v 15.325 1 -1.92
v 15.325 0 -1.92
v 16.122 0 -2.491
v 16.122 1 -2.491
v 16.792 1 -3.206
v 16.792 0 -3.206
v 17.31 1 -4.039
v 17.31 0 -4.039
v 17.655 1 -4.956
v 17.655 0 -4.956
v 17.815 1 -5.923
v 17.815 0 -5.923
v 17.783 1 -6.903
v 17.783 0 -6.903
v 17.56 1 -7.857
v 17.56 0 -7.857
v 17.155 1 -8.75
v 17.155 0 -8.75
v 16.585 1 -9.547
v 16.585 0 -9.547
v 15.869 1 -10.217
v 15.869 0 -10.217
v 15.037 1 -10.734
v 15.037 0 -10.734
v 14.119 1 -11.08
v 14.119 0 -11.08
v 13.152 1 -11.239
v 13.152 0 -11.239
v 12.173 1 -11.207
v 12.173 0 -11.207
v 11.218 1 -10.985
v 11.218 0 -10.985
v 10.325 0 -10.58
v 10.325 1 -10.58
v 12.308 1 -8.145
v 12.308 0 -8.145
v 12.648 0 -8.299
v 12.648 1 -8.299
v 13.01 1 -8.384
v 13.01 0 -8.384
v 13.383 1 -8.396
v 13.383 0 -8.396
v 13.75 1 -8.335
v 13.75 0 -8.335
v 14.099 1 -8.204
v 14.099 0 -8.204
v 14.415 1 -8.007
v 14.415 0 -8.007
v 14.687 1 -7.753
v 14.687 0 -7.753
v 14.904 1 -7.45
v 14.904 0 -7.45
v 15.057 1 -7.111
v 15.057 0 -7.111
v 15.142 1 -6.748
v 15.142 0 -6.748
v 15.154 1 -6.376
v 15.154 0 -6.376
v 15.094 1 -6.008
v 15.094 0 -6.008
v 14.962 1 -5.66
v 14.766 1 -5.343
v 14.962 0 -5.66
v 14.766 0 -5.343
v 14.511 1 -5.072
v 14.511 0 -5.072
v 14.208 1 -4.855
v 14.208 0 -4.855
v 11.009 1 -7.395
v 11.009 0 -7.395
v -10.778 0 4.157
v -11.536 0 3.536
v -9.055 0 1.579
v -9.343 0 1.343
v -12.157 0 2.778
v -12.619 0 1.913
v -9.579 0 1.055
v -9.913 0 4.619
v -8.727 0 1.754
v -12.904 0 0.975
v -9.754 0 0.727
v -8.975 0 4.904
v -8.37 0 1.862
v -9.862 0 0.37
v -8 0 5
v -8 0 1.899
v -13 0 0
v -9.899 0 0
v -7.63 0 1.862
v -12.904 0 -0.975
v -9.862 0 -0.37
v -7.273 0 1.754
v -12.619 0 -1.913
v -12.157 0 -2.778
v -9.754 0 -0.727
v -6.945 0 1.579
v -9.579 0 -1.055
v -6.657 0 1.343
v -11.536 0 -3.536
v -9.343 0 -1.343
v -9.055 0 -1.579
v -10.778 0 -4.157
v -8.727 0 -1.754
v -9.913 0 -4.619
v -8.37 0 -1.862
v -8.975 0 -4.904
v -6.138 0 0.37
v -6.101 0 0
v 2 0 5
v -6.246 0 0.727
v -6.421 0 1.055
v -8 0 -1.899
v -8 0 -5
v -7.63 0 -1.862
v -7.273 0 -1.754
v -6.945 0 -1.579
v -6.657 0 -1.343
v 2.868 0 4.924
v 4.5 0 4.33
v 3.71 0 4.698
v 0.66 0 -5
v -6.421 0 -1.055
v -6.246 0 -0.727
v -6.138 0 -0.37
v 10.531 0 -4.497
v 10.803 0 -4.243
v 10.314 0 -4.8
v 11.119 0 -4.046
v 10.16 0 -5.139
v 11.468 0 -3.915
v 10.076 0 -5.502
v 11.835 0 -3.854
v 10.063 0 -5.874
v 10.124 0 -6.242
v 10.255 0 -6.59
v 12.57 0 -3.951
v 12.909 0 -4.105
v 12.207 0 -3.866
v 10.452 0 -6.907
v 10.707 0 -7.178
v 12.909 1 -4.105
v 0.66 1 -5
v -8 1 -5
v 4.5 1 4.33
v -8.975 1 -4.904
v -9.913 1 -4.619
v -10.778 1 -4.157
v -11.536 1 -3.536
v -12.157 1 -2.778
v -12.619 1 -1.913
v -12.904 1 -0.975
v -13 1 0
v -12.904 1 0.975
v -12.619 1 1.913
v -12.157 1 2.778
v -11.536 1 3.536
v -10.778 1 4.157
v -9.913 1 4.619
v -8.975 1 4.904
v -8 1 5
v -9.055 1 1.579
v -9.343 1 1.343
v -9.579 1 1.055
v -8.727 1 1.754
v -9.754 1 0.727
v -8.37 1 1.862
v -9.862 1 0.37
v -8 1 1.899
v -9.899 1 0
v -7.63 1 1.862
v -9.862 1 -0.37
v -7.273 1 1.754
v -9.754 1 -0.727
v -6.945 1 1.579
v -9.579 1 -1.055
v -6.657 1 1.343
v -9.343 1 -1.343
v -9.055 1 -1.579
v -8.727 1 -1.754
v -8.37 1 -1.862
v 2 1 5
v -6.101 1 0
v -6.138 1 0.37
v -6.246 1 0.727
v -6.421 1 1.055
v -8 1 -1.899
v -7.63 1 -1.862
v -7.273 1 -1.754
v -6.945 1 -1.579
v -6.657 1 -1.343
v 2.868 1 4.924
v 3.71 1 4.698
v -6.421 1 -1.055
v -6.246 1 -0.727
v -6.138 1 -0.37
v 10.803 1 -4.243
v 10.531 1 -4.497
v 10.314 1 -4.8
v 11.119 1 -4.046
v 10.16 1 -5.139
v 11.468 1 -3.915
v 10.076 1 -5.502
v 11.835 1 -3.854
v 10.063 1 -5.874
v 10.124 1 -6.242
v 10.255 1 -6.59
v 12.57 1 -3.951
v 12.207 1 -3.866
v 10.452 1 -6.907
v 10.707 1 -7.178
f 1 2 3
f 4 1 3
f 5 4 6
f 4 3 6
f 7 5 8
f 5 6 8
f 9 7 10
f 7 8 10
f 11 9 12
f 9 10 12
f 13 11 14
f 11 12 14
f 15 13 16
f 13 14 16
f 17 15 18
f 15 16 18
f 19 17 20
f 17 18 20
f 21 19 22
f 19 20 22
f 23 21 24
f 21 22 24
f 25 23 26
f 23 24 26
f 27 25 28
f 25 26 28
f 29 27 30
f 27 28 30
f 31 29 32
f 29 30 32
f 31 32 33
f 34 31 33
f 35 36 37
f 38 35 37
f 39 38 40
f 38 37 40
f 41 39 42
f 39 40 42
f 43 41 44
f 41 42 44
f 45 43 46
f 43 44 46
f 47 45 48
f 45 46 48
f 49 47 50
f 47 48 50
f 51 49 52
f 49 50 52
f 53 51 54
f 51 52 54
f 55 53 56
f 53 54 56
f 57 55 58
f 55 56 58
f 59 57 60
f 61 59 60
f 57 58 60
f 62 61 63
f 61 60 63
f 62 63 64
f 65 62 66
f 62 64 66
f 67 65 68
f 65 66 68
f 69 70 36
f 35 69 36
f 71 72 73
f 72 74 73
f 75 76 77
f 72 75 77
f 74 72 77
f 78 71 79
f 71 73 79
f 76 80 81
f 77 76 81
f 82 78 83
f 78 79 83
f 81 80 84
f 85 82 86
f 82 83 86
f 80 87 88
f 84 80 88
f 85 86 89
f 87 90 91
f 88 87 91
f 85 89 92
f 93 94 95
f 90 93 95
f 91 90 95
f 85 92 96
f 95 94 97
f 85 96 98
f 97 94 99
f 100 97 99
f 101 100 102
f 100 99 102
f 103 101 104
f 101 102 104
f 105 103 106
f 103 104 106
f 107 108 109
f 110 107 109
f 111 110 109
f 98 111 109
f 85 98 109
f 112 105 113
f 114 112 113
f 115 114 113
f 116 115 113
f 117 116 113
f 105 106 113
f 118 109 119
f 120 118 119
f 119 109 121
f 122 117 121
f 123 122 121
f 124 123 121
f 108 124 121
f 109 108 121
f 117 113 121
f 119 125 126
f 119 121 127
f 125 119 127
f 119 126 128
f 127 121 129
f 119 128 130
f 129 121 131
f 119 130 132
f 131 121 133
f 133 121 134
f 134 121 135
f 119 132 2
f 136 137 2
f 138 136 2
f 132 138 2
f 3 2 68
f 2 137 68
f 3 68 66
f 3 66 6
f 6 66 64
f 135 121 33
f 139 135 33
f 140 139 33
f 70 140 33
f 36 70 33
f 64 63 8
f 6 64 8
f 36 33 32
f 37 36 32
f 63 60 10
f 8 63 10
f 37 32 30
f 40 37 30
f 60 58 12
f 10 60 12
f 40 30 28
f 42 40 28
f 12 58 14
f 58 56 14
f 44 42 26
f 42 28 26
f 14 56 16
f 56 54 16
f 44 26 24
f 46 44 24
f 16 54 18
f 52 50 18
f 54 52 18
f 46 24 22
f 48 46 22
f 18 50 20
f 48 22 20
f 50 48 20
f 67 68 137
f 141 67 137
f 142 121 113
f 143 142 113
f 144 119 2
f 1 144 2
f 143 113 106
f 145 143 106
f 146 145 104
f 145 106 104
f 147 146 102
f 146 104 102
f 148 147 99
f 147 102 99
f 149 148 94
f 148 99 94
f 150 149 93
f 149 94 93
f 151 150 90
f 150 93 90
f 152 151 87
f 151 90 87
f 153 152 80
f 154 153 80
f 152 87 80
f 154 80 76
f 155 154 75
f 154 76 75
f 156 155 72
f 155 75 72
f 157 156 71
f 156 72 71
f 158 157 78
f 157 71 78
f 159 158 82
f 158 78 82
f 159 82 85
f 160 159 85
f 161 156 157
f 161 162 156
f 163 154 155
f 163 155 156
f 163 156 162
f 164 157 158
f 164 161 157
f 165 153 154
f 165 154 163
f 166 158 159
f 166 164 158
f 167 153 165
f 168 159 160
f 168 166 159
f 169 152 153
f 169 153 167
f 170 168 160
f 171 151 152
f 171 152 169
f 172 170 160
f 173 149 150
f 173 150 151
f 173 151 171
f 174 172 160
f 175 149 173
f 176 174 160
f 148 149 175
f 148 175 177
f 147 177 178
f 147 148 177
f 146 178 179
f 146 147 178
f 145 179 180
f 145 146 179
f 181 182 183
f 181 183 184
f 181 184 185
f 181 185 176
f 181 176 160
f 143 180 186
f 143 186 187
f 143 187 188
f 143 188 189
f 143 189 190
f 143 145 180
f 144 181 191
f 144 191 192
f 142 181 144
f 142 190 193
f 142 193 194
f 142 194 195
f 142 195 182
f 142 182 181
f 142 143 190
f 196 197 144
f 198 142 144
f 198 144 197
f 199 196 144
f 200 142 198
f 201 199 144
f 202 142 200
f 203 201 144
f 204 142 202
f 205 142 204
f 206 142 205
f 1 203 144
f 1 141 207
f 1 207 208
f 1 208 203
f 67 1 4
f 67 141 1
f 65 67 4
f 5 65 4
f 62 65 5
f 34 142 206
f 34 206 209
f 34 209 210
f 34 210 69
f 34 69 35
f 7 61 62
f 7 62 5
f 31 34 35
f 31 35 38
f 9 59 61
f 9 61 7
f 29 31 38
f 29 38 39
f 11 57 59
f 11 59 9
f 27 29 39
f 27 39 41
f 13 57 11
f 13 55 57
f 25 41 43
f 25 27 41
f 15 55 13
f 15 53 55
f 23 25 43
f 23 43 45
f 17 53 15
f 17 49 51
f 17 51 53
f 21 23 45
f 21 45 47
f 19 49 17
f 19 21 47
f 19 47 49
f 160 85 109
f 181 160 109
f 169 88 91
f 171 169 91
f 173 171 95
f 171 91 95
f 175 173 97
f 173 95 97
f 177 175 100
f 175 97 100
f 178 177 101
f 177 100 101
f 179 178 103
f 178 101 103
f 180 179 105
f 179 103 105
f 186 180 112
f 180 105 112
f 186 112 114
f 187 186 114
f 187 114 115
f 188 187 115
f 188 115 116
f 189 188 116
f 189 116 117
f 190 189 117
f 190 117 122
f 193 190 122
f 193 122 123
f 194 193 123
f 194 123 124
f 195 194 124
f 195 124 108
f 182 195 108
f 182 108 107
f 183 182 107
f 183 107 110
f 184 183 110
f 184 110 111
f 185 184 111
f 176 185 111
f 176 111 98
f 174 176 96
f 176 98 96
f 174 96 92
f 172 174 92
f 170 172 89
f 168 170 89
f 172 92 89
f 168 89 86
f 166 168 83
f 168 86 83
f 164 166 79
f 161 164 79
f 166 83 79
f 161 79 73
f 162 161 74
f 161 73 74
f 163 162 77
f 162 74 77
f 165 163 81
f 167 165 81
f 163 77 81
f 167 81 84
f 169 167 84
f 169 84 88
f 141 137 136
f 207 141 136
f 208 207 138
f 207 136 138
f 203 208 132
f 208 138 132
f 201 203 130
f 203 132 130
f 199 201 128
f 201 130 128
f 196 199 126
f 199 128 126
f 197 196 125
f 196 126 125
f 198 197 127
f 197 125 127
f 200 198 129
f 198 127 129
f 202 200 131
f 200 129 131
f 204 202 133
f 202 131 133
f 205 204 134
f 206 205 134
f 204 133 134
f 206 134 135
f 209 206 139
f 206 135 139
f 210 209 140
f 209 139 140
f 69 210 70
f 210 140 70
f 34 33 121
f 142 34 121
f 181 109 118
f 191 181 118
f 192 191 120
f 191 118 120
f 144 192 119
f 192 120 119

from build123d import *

# Parameters (mm, degrees)
BOSS_EXTRUDE1_DEPTH   = 1
F_6_CLEARANCE_HOLE1_D = 3.7973


with BuildPart() as part:
    # Sketch1 → Boss-Extrude1 (new body)
    # profile 1 of 3: a face of its own
    with BuildSketch(Plane(origin=(0, 0, 0), x_dir=(1, 0, 0), z_dir=(0, 1, 0))):
        with BuildLine():
            Line((0.660254038, 5), (-8, 5))
            ThreePointArc((-8, 5), (-13, 0), (-8, -5))
            Line((-8, -5), (2, -5))
            ThreePointArc((2, -5), (-2.829629131, -1.294095226), (-0.5, 4.330127019))
            Line((-0.5, 4.330127019), (0.660254038, 5))
        make_face()
    # profile 2 of 3: a face of its own
    with BuildSketch(Plane(origin=(0, 0, 0), x_dir=(1, 0, 0), z_dir=(0, 1, 0))):
        with BuildLine():
            Line((2, 5), (0.660254038, 5))
            Line((0.660254038, 5), (-0.5, 4.330127019))
            ThreePointArc((-0.5, 4.330127019), (-2.829629131, -1.294095226), (2, -5))
            ThreePointArc((2, -5), (3.294095226, -4.829629131), (4.5, -4.330127019))
            ThreePointArc((4.5, -4.330127019), (6.829629131, 1.294095226), (2, 5))
        make_face()
    # profile 3 of 3: a face of its own
    with BuildSketch(Plane(origin=(0, 0, 0), x_dir=(1, 0, 0), z_dir=(0, 1, 0))):
        with BuildLine():
            Line((10.325317547, 10.580127019), (0.660254038, 5))
            Line((0.660254038, 5), (2, 5))
            ThreePointArc((2, 5), (6.829629131, 1.294095226), (4.5, -4.330127019))
            Line((4.5, -4.330127019), (15.325317547, 1.919872981))
            ThreePointArc((15.325317547, 1.919872981), (17.155444566, 8.75), (10.325317547, 10.580127019))
        make_face()
        with BuildLine():
            ThreePointArc((12.909292144, 4.104551733), (10.313843876, 4.8), (11.009292144, 7.395448267))
            Line((11.009292144, 7.395448267), (12.308330249, 8.145448267))
            ThreePointArc((12.308330249, 8.145448267), (14.903778516, 7.45), (14.208330249, 4.854551733))
            Line((14.208330249, 4.854551733), (12.909292144, 4.104551733))
        make_face(mode=Mode.SUBTRACT)
    extrude(amount=BOSS_EXTRUDE1_DEPTH)

    # #6 Clearance Hole1 (through all)
    with Locations(Plane(origin=(0, 1, 0), x_dir=(1, 0, 0), z_dir=(0, 1, 0))):
        with Locations((-8, 0)):
            Hole(F_6_CLEARANCE_HOLE1_D / 2)


solid = part.part
